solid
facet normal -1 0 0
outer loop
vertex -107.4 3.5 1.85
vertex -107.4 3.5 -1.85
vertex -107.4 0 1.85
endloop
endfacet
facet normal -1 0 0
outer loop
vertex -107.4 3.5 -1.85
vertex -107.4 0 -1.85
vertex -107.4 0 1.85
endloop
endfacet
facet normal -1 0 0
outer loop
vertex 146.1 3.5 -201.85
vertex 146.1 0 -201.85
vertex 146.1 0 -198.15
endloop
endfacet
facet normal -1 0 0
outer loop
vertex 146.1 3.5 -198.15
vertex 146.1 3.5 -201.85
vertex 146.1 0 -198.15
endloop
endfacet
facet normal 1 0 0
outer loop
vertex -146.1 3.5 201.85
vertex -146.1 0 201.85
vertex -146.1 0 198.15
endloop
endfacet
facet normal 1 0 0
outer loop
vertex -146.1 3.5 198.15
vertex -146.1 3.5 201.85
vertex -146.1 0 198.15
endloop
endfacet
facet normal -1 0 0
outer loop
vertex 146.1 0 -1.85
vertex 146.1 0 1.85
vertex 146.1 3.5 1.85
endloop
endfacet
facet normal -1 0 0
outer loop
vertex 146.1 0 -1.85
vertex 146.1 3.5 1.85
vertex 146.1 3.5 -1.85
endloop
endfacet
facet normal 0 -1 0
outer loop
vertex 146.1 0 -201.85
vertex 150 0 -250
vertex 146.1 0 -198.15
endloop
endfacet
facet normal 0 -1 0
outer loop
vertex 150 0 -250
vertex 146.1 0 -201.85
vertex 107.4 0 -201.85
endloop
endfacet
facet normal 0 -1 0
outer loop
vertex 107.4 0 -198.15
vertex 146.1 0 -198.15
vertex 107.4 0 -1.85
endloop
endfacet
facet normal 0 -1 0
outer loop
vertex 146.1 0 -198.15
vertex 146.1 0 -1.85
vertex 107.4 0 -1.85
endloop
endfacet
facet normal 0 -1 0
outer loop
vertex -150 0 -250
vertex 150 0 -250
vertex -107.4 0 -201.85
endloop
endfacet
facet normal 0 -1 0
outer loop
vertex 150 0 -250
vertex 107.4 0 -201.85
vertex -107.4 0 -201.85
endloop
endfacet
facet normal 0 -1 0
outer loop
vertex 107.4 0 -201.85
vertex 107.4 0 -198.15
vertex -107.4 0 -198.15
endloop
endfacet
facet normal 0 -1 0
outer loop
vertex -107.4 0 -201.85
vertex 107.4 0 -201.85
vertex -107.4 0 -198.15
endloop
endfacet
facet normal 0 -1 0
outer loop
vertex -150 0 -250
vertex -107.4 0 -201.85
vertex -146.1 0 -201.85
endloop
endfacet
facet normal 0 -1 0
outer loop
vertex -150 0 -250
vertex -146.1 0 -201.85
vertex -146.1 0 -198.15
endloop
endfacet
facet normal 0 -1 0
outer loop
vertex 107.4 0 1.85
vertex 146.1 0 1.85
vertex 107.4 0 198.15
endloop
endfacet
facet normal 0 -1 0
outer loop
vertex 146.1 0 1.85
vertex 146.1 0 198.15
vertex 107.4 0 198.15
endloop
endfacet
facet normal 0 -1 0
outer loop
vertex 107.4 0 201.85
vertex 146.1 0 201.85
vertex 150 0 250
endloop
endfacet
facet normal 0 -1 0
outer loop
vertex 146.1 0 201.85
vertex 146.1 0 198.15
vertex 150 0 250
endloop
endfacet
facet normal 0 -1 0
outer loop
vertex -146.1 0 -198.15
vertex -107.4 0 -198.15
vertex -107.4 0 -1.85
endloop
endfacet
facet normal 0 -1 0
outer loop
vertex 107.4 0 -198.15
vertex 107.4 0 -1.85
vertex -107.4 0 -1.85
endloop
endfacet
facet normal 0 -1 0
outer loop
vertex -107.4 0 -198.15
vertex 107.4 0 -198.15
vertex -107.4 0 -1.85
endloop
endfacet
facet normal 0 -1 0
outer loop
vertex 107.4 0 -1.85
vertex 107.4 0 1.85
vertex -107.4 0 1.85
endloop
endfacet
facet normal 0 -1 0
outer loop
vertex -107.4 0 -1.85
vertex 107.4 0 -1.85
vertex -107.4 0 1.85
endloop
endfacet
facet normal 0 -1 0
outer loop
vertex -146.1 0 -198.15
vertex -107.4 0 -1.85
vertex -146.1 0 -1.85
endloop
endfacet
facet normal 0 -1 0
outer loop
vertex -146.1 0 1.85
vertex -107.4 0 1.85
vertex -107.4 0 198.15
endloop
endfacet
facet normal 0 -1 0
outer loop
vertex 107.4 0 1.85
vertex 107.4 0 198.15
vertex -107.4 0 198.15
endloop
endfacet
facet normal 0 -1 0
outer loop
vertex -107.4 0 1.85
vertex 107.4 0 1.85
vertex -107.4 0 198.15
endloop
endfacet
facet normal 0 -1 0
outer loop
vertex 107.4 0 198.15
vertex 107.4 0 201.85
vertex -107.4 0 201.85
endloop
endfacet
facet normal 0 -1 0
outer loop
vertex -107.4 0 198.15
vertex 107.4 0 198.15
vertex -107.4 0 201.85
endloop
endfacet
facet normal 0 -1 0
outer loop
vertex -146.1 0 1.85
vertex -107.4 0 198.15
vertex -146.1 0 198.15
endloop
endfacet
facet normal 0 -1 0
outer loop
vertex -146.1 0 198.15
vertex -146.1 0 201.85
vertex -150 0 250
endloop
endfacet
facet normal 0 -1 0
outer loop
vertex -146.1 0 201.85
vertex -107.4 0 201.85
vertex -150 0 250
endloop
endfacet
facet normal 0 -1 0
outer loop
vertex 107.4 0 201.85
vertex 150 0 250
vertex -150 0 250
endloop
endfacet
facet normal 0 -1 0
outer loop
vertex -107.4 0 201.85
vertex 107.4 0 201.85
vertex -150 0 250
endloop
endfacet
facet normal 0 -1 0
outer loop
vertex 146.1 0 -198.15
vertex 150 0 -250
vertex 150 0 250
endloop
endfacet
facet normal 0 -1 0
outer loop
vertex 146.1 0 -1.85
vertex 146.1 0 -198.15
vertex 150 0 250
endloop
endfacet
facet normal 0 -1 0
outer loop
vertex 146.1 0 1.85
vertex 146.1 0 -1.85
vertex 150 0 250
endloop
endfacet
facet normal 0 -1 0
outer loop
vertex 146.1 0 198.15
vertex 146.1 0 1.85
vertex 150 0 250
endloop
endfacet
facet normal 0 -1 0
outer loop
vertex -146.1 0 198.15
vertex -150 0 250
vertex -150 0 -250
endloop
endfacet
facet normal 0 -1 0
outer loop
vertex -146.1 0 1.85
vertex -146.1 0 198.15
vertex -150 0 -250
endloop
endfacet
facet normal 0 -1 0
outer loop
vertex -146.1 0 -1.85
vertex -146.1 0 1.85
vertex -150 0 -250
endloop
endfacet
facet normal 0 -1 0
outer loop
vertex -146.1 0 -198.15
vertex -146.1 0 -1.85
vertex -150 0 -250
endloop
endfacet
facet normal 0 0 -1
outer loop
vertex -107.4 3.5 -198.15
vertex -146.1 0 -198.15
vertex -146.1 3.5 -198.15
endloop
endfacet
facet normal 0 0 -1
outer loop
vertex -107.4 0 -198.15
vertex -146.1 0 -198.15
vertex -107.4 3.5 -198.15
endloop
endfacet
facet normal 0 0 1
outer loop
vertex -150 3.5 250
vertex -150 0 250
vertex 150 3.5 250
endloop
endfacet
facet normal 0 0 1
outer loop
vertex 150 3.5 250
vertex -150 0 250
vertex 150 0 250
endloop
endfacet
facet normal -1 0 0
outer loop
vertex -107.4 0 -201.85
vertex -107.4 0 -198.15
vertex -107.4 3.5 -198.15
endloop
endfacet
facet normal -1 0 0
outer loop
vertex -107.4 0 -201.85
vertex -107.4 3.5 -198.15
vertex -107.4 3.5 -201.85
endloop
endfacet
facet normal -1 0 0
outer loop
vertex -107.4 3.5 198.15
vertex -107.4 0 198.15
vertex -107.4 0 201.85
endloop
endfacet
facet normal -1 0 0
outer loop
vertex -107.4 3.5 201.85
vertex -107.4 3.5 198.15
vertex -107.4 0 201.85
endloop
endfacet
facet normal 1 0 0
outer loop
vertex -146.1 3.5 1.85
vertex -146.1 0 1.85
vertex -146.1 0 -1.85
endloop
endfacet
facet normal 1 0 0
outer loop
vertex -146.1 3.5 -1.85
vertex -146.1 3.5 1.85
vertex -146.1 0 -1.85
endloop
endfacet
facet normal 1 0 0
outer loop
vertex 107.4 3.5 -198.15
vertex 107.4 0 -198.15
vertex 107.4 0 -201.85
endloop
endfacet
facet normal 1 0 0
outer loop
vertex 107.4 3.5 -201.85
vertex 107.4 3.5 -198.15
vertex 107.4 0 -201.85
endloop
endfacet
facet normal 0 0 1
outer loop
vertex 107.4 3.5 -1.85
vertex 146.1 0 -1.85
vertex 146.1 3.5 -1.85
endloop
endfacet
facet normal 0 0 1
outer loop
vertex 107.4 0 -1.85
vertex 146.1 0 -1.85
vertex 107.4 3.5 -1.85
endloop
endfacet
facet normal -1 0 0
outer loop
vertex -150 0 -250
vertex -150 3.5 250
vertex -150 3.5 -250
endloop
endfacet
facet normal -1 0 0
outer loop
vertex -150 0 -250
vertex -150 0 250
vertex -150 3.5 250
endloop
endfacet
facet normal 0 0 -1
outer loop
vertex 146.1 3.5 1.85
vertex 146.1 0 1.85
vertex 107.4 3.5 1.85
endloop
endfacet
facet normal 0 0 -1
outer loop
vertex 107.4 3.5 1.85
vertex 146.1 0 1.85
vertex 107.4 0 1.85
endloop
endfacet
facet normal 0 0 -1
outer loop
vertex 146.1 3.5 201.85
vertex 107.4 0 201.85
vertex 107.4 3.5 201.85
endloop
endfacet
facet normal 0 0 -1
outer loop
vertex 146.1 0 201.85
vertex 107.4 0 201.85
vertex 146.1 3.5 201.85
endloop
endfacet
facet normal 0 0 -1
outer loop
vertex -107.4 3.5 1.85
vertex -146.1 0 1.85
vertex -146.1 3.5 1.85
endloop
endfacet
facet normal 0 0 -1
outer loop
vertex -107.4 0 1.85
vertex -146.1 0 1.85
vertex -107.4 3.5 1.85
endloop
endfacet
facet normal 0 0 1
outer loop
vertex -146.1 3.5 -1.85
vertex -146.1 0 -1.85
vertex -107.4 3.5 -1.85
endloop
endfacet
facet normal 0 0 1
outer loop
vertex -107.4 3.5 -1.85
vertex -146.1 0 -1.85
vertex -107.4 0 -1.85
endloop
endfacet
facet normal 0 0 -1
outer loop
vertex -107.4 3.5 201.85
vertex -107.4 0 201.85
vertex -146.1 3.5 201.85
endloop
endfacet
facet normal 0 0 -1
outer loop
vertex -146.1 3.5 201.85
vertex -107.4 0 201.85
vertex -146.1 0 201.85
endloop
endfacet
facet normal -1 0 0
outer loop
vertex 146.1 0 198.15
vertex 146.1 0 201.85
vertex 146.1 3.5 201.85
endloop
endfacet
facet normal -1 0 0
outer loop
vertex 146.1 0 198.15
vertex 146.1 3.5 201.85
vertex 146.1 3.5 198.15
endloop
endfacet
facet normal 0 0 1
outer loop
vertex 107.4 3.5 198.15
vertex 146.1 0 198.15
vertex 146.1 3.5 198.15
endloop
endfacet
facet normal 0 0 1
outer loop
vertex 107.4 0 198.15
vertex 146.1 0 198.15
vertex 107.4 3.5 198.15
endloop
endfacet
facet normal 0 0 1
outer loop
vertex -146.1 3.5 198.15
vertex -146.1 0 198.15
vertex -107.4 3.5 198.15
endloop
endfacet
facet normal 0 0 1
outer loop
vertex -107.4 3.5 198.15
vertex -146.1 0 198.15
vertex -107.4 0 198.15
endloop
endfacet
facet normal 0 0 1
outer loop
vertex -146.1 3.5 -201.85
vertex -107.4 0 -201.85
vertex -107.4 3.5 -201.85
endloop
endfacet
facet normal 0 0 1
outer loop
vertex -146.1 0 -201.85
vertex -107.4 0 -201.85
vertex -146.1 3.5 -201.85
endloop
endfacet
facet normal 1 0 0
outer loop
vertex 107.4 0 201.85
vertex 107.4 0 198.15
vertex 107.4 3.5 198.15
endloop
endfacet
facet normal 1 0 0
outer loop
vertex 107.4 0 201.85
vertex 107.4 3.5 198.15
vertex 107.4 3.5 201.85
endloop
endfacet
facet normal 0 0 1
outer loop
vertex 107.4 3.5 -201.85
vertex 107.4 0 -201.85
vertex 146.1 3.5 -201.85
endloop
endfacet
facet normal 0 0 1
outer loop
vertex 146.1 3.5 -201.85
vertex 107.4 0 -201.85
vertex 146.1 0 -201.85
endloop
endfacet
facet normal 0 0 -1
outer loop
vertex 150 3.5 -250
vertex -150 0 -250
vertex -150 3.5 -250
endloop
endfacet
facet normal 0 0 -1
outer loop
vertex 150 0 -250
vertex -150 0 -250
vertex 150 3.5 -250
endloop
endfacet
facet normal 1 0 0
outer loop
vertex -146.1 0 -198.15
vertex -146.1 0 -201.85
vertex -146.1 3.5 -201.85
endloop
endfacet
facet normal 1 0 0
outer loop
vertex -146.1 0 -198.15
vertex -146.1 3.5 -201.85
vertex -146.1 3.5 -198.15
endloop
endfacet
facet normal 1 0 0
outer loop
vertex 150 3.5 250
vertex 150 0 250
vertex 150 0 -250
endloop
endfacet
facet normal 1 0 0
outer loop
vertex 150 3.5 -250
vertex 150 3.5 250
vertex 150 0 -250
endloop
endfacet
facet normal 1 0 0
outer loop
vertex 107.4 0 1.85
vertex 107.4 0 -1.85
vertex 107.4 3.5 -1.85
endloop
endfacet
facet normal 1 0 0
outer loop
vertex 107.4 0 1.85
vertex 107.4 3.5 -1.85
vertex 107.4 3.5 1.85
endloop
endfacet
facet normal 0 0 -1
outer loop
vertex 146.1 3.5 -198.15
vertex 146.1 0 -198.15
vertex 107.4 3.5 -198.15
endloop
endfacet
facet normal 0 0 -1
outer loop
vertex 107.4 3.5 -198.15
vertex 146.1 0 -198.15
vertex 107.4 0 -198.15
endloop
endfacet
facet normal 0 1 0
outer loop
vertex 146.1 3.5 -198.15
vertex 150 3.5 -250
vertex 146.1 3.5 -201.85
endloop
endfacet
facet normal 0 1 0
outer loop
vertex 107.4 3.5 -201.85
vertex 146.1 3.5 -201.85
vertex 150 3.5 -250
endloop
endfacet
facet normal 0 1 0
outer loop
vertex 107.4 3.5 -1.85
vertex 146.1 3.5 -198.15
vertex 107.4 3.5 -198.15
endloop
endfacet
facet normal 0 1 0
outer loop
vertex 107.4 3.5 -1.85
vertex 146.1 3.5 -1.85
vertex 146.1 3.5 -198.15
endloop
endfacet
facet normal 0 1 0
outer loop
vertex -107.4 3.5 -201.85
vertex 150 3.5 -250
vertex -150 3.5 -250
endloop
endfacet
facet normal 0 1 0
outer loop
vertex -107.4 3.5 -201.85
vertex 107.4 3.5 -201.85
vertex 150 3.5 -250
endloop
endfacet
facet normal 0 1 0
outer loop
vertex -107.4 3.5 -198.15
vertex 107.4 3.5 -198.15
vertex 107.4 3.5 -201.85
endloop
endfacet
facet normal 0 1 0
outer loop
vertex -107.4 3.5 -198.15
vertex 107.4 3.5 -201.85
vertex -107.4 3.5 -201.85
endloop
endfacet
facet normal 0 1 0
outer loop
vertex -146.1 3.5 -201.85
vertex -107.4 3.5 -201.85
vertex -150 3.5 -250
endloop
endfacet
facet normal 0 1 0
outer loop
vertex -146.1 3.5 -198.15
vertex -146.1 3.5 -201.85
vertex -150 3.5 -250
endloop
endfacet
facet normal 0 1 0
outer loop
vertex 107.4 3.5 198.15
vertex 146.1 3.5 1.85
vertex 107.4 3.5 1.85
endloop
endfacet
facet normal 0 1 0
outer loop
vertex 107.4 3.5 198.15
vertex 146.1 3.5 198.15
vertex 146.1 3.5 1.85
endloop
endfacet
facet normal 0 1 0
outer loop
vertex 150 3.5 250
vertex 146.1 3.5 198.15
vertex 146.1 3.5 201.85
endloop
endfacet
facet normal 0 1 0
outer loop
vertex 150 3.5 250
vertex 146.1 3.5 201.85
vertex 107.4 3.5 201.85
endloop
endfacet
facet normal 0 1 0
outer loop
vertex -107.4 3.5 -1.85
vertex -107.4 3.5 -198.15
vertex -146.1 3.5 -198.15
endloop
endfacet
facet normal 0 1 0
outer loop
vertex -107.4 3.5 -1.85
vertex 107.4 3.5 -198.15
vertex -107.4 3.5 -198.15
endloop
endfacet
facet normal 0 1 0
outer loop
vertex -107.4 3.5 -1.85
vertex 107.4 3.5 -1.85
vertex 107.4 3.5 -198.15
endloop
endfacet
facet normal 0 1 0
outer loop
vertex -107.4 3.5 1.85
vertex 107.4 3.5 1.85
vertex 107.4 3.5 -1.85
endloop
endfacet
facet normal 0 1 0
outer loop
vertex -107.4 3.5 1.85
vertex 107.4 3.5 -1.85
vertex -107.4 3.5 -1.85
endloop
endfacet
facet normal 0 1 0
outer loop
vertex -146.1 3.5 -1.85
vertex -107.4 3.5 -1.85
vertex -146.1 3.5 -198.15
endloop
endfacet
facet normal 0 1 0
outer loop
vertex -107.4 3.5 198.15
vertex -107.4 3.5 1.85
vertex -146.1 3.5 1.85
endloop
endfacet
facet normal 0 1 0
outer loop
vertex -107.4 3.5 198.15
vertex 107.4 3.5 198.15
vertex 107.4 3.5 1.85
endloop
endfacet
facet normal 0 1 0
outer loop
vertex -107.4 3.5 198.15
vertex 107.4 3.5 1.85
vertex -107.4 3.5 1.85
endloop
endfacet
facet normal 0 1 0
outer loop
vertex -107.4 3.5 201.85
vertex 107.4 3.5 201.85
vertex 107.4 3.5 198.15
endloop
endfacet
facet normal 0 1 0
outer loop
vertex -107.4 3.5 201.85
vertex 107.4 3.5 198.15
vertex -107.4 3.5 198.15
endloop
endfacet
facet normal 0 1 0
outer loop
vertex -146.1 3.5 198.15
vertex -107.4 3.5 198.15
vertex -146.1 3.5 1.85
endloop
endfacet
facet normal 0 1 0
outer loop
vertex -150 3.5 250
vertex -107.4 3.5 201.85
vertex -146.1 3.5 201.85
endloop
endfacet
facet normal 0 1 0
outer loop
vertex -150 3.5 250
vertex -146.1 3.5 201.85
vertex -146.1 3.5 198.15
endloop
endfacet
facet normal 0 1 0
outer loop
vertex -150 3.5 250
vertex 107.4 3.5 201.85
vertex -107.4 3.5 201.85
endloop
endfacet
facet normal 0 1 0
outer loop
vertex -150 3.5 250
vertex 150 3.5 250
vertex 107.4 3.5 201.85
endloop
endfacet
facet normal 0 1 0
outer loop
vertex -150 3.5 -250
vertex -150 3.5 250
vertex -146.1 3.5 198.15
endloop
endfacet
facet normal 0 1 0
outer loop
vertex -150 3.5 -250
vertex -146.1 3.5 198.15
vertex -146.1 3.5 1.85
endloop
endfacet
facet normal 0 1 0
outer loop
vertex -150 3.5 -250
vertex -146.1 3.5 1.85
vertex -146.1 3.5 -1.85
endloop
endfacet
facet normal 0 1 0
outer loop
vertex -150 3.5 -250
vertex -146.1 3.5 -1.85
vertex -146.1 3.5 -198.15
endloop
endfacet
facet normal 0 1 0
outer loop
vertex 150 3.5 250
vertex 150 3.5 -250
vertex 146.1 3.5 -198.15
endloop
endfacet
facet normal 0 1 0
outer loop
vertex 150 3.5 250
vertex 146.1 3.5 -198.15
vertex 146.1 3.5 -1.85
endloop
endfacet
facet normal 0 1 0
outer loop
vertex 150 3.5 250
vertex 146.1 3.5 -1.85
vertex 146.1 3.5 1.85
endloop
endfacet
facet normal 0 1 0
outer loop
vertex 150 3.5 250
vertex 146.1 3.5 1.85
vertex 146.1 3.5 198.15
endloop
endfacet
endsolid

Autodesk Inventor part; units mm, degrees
ref_plane "YZ Plane" through (0, 0, 0) normal (1, 0, 0) x (0, 1, 0)
ref_plane "XZ Plane" through (0, 0, 0) normal (0, 1, 0) x (-1, 0, 0)
ref_plane "XY Plane" through (0, 0, 0) normal (0, 0, 1) x (1, 0, 0)
sketch "스케치1" plane through (0, 0, 0) normal (0, 1, 0) x (-1, 0, 0)
  line L0 (150, 0) -> (150, -250)
  line L1 (150, -250) -> (0, -250)
  line L2 (210, 0) -> (-210, 0) projected
  line L3 (0, -350) -> (0, 350) projected
  line L4 (100, 0) -> (100, -250) construction
  line L5 (107.4, -198.15) -> (107.4, -201.85)
  line L6 (107.4, -201.85) -> (146.1, -201.85)
  line L7 (146.1, -198.15) -> (107.4, -198.15)
  line L8 (146.1, -201.85) -> (146.1, -198.15)
  line L9 (146.1, 0) -> (146.1, -1.85)
  line L10 (146.1, -1.85) -> (107.4, -1.85)
  line L11 (107.4, -1.85) -> (107.4, 0)
  line L12 (150, 0) -> (150, 250)
  line L13 (150, 250) -> (0, 250)
  line L14 (100, 0) -> (100, 250) construction
  line L15 (146.1, 198.15) -> (107.4, 198.15)
  line L16 (146.1, 201.85) -> (146.1, 198.15)
  line L17 (107.4, 201.85) -> (146.1, 201.85)
  line L18 (107.4, 198.15) -> (107.4, 201.85)
  line L19 (146.1, 0) -> (146.1, 1.85)
  line L20 (146.1, 1.85) -> (107.4, 1.85)
  line L21 (107.4, 1.85) -> (107.4, 0)
  line L22 (-150, 0) -> (-150, -250)
  line L23 (-150, -250) -> (0, -250)
  line L24 (-100, 0) -> (-100, -250) construction
  line L25 (-146.1, -198.15) -> (-107.4, -198.15)
  line L26 (-146.1, -201.85) -> (-146.1, -198.15)
  line L27 (-107.4, -201.85) -> (-146.1, -201.85)
  line L28 (-107.4, -198.15) -> (-107.4, -201.85)
  line L29 (-146.1, 0) -> (-146.1, -1.85)
  line L30 (-146.1, -1.85) -> (-107.4, -1.85)
  line L31 (-107.4, -1.85) -> (-107.4, 0)
  line L32 (-146.1, 1.85) -> (-107.4, 1.85)
  line L33 (-146.1, 0) -> (-146.1, 1.85)
  line L34 (-107.4, 1.85) -> (-107.4, 0)
  line L35 (-100, 0) -> (-100, 250) construction
  line L36 (-150, 0) -> (-150, 250)
  line L37 (-146.1, 198.15) -> (-107.4, 198.15)
  line L38 (-107.4, 198.15) -> (-107.4, 201.85)
  line L39 (-146.1, 201.85) -> (-146.1, 198.15)
  line L40 (-107.4, 201.85) -> (-146.1, 201.85)
  line L41 (-150, 250) -> (0, 250)
  point P0 (0, 0)
  dimension "d2" = 250
  dimension "d3" = 150
  dimension "d4" = 50
  dimension "d13" = 38.7
  dimension "d14" = 3.7
  dimension "d15" = 48.15
  dimension "d16" = 1.85
  dimension "d17" = 38.7
  dimension "d18" = 7.4
  dimension "d19" = 7.4
extrude "돌출1" add sketch "스케치1" along normal blind 3.5 contours L0 L1 L3 L2 L11 L10 L9 | L2 L19 L20 L21 L3 L13 L12 | L23 L22 L2 L29 L30 L31 L3 | L3 L2 L34 L32 L33 L36 L41
properties part number "부품1"
